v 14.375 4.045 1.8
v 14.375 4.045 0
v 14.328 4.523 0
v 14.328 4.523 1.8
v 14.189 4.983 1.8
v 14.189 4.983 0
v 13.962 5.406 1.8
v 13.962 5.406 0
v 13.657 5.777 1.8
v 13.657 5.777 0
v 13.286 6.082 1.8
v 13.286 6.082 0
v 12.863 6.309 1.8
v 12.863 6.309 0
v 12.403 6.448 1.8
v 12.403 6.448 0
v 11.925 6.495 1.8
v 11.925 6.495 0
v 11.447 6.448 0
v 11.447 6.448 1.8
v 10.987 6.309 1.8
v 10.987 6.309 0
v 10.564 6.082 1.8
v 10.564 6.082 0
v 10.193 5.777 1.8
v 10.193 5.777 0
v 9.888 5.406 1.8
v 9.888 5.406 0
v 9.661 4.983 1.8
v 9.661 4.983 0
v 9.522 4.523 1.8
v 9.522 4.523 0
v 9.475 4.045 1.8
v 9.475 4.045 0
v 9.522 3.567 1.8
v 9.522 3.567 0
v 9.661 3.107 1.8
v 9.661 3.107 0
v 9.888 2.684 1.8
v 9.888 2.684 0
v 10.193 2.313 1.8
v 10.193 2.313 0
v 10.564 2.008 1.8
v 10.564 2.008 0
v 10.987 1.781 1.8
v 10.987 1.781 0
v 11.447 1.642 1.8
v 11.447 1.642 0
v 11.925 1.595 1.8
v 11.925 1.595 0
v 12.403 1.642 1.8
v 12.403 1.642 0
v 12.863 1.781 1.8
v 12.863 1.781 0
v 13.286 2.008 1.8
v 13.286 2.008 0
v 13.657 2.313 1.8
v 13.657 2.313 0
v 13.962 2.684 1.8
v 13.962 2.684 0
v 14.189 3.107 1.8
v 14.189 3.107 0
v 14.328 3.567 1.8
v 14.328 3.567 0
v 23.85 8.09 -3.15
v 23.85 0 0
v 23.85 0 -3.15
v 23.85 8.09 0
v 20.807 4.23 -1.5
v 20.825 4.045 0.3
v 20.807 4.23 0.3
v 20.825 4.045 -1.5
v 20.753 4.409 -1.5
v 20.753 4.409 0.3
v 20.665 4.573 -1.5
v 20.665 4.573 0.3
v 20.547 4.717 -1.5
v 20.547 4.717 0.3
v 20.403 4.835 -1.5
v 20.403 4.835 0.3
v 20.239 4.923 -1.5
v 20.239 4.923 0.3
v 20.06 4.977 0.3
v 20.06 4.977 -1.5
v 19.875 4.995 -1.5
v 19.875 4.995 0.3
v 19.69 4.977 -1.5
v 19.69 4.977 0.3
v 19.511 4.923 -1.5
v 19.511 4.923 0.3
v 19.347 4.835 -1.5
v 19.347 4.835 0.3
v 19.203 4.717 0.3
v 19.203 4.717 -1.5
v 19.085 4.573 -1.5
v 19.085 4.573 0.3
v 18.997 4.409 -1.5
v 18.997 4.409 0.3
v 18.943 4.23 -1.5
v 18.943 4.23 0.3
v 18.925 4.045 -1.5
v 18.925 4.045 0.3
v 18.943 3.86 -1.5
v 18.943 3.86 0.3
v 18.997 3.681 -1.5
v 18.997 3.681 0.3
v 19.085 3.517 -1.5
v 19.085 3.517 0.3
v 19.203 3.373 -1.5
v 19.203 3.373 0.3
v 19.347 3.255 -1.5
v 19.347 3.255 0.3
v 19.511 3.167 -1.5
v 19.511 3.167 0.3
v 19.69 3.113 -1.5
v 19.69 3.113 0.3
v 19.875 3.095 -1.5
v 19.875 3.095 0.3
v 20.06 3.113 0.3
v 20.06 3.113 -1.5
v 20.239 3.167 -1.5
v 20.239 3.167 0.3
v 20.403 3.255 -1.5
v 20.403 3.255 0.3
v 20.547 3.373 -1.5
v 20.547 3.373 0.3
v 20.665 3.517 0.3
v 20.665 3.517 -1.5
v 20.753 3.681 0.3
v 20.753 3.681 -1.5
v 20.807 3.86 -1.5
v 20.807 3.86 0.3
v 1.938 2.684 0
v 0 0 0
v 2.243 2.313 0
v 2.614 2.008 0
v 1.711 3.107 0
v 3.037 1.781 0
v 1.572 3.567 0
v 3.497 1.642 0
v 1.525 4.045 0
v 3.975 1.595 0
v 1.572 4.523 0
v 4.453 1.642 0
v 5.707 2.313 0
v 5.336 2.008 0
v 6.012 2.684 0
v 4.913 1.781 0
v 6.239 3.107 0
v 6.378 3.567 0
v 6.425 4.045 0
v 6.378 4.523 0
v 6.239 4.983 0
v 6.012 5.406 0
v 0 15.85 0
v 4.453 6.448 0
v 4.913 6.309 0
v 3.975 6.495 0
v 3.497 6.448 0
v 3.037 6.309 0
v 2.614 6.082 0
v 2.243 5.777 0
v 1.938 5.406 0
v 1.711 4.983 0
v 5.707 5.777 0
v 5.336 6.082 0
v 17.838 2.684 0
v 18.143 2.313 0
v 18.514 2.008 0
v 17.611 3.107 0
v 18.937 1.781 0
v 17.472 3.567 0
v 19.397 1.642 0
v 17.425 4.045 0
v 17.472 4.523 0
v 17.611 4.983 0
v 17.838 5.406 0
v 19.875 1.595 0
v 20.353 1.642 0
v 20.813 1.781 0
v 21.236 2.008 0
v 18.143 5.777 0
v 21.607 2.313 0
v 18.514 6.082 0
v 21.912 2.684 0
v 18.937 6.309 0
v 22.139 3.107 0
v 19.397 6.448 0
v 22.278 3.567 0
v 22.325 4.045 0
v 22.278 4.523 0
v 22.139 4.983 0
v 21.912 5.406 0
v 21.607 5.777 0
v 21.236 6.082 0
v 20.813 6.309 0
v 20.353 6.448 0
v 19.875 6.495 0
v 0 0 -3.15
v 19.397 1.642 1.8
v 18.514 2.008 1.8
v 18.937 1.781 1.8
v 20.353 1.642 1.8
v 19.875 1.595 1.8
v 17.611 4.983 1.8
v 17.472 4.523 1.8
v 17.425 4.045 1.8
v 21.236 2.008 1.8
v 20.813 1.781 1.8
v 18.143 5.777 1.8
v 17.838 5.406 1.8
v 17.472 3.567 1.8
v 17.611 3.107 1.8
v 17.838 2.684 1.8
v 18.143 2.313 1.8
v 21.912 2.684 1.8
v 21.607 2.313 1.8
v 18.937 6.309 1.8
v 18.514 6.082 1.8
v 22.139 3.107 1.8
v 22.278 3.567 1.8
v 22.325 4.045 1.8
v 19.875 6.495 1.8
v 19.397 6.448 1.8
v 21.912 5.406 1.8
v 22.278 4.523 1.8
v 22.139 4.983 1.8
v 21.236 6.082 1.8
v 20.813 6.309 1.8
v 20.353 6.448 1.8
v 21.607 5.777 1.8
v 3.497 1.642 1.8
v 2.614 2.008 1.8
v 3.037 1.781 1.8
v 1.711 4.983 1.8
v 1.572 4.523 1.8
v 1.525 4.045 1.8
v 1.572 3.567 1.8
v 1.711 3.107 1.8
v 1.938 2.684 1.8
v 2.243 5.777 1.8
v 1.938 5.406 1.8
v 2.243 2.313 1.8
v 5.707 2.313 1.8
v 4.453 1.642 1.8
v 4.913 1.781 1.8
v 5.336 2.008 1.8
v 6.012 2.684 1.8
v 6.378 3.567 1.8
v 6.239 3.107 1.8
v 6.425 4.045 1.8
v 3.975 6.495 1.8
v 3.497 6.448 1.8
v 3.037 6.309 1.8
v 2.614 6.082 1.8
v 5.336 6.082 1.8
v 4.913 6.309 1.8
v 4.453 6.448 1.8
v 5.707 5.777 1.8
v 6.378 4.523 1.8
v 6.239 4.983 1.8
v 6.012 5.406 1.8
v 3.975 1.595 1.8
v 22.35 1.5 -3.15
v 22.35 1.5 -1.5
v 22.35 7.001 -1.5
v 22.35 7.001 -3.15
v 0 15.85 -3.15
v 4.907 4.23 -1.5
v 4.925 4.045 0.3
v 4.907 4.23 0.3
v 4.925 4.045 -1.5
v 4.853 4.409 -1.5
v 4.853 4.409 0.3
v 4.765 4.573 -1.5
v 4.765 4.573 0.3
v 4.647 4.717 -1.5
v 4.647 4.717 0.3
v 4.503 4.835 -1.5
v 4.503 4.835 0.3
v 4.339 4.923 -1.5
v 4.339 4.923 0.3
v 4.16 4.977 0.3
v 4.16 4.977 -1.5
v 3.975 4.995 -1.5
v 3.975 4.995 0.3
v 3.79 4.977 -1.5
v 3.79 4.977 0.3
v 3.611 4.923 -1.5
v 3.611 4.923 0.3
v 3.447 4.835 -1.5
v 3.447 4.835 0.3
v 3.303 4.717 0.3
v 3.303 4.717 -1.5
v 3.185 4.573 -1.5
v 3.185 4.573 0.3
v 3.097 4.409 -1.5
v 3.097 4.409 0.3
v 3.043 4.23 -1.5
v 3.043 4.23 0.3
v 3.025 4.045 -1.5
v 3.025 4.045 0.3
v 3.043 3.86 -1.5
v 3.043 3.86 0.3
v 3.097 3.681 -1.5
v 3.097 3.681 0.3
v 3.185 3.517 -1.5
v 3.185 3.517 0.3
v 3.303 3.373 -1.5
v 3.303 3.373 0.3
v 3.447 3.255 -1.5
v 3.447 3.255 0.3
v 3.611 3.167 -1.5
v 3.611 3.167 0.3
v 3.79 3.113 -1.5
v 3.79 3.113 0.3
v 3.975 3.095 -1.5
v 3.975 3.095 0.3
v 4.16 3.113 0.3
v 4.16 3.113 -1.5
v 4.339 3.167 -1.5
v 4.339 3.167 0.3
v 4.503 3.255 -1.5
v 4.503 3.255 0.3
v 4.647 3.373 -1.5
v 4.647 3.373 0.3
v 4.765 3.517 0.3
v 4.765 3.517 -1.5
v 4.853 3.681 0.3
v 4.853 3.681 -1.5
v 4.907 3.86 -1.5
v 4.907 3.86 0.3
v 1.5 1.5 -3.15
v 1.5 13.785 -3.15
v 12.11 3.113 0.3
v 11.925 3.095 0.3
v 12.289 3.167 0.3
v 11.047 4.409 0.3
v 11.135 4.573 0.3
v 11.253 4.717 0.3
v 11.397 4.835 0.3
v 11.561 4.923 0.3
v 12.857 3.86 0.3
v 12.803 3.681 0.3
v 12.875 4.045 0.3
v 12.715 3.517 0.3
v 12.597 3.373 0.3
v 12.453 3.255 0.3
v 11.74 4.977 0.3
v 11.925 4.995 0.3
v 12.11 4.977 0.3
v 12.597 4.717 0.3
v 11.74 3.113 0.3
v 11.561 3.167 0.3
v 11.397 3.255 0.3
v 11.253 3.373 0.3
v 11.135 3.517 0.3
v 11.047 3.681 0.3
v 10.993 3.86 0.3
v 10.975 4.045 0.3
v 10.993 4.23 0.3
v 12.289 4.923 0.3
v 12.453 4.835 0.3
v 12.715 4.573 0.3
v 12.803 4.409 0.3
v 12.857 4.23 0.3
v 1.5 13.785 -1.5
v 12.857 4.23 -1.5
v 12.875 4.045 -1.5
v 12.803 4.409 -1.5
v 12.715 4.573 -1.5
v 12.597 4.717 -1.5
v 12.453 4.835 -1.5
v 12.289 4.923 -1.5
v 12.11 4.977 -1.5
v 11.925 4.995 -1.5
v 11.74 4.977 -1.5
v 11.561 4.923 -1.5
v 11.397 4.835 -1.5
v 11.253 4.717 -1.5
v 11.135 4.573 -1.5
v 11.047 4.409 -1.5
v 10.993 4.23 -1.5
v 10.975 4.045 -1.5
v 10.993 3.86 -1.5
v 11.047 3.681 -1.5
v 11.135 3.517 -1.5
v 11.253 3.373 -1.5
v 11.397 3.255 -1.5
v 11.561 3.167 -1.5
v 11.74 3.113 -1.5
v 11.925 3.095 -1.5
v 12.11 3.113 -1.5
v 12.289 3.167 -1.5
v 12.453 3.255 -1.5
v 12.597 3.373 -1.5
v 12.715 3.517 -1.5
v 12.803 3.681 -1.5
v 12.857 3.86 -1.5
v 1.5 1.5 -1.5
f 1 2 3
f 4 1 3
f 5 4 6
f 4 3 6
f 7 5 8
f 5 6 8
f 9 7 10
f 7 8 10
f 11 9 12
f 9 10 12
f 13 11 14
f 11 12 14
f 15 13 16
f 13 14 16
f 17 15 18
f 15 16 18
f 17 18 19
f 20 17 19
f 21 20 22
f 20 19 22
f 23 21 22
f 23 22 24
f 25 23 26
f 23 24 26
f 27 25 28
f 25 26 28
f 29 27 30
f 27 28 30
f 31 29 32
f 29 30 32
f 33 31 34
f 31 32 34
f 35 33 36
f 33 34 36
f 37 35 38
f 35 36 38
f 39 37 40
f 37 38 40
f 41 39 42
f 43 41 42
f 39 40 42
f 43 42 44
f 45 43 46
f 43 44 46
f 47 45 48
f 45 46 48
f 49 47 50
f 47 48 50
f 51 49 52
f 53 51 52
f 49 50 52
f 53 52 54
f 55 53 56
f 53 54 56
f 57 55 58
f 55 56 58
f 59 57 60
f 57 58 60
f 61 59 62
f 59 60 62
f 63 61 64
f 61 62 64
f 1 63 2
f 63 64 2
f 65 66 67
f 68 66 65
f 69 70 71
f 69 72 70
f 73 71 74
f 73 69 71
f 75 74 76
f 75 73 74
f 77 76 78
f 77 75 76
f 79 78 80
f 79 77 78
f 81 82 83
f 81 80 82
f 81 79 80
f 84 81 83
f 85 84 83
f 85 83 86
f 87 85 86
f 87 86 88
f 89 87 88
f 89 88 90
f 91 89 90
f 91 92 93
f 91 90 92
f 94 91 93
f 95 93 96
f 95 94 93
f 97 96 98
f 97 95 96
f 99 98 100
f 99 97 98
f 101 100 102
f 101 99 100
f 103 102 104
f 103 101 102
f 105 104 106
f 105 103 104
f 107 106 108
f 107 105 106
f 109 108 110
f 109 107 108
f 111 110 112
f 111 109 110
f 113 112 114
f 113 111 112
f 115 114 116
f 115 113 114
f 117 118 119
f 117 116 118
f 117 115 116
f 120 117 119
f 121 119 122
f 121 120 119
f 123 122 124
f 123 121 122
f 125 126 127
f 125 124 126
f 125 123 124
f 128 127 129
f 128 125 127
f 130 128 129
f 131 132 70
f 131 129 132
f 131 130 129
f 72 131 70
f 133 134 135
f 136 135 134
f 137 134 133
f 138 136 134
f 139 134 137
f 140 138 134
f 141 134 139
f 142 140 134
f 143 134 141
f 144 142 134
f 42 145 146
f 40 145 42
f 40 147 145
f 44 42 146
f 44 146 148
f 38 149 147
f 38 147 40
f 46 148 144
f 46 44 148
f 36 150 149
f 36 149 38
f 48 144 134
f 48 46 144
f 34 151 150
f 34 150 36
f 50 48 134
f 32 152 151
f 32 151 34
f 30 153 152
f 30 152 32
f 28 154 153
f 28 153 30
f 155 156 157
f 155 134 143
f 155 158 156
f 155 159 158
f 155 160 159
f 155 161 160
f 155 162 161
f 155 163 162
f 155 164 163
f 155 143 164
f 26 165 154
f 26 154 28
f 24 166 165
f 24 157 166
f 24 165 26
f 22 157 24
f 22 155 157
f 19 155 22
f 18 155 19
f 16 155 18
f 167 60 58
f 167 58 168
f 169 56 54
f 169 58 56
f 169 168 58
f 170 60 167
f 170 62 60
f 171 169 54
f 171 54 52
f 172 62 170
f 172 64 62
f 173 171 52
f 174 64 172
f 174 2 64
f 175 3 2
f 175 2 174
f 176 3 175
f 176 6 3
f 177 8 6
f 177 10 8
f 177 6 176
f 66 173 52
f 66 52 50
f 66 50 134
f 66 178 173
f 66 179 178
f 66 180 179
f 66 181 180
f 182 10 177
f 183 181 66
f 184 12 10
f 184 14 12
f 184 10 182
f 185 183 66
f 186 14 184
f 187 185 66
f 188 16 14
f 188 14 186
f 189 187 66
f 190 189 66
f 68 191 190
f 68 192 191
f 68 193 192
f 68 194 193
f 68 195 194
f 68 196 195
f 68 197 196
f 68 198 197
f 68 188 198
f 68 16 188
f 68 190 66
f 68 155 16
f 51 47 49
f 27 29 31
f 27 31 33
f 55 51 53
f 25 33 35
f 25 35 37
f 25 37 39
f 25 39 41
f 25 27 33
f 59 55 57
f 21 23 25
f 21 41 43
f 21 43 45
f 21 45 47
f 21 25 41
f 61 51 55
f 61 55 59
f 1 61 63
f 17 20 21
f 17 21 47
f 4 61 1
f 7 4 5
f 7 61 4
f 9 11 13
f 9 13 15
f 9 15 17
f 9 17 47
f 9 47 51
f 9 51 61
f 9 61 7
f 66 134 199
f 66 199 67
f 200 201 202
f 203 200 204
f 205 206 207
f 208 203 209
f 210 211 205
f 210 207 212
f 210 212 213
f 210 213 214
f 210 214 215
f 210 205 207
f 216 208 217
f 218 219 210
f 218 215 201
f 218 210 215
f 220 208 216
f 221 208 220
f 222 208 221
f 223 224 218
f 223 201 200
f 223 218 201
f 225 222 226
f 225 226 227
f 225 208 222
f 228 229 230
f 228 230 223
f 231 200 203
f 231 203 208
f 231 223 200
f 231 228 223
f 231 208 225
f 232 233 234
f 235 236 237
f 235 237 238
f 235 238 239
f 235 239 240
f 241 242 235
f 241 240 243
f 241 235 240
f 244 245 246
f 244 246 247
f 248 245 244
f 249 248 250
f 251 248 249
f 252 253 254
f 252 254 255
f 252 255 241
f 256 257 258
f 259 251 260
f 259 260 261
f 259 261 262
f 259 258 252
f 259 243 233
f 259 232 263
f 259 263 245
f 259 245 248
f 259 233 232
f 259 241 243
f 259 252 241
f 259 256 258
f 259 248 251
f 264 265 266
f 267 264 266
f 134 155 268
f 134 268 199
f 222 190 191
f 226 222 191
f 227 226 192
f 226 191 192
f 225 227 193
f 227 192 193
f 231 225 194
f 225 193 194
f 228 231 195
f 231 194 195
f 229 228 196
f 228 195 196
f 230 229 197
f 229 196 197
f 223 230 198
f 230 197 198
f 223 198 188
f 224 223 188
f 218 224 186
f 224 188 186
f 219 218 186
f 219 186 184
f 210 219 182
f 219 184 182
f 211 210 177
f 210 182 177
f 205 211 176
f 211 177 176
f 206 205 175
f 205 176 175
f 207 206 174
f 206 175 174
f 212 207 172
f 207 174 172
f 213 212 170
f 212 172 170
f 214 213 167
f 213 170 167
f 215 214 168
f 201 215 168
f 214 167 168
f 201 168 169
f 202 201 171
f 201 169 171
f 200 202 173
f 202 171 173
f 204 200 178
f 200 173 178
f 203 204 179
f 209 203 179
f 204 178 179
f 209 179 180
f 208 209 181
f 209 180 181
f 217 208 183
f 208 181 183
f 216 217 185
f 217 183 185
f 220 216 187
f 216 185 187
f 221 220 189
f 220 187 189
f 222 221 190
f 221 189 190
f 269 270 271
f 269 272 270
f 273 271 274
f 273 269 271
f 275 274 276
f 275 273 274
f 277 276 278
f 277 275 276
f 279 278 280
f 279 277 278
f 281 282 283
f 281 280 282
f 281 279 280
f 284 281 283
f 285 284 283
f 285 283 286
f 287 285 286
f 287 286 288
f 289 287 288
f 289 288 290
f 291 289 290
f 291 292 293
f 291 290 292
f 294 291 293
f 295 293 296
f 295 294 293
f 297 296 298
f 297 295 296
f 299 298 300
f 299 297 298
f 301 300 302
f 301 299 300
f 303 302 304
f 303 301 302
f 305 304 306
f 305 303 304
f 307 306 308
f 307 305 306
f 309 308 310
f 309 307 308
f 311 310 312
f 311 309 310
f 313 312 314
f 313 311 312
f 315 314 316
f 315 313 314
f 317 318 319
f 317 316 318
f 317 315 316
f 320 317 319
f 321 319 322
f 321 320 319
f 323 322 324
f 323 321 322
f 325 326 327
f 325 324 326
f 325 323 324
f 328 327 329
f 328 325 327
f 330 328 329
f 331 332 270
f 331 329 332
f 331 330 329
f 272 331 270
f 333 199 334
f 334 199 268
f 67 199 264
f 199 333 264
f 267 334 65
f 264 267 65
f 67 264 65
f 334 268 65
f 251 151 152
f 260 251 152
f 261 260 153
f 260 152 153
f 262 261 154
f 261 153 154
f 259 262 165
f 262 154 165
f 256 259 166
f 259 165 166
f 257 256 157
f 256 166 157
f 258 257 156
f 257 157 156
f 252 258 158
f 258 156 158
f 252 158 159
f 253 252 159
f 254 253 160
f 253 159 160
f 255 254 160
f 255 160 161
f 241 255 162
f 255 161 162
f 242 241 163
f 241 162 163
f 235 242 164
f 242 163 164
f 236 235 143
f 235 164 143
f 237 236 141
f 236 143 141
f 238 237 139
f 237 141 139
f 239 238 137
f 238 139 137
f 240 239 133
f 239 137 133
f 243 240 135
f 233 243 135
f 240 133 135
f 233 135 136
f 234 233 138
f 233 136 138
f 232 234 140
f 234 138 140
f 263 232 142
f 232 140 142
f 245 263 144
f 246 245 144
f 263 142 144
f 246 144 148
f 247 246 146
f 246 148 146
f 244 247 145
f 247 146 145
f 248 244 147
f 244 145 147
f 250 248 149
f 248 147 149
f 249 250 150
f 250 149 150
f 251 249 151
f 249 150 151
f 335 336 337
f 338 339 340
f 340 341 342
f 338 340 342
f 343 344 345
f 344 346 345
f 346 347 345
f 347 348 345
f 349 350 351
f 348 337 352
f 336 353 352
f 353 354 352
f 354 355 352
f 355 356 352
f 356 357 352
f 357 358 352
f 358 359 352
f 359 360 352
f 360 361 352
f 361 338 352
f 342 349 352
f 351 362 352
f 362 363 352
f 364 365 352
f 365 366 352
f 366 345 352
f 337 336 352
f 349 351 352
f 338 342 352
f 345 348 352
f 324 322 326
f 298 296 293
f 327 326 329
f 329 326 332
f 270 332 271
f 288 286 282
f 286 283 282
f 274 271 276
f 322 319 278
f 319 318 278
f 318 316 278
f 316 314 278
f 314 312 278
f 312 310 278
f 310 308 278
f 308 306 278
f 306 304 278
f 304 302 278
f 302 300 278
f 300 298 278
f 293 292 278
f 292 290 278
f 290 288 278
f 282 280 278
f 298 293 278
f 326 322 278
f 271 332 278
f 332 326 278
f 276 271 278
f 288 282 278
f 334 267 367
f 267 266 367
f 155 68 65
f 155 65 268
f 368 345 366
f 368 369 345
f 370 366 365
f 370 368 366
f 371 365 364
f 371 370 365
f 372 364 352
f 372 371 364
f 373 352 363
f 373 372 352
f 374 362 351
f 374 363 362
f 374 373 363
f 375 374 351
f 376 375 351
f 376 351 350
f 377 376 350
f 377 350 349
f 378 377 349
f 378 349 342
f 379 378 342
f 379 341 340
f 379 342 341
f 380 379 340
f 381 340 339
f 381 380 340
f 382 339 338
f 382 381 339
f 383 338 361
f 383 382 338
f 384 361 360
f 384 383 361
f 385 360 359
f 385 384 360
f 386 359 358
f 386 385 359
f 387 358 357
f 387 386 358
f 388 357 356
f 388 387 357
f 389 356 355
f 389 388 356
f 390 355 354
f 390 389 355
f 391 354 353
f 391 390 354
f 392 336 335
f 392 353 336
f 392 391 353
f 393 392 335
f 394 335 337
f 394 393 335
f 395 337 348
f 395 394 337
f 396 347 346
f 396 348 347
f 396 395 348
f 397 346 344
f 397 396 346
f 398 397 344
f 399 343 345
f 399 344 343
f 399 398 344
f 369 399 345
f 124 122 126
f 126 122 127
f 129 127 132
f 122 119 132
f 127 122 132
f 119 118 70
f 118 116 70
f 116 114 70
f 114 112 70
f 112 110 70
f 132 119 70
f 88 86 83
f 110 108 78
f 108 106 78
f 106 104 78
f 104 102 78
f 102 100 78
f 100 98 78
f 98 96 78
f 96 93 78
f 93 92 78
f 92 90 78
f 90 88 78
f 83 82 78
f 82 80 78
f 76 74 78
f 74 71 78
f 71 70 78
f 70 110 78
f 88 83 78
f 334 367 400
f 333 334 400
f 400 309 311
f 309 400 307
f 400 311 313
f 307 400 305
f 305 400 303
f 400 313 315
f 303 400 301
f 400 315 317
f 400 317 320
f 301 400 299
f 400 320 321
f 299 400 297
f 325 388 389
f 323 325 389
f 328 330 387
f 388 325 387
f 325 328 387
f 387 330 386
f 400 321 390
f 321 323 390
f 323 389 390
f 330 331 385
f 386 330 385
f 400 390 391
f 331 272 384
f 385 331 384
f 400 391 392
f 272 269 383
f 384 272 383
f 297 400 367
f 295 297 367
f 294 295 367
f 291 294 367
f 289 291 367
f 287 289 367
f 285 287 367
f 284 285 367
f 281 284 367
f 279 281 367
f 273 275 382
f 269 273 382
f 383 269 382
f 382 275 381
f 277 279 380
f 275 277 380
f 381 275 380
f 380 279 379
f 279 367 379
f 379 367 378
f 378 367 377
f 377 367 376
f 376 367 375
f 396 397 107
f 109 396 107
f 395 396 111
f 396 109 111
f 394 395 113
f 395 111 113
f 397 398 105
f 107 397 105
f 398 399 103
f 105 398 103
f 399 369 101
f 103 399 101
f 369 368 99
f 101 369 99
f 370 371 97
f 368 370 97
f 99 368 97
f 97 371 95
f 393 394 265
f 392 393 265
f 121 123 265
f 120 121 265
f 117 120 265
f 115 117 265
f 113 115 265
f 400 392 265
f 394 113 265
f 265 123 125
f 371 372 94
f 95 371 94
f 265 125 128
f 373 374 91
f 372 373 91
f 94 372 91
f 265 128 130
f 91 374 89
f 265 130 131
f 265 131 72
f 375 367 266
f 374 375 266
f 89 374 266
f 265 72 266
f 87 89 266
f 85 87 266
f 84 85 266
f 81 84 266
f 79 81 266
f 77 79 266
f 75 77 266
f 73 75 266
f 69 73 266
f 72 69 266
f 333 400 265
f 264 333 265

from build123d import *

# Parameters (mm, degrees)
BOSS_EXTRUDE1_DEPTH = 3.15
SKETCH2_R           = 2.45
BOSS_EXTRUDE2_DEPTH = 1.8
SHELL1_T            = -1.5


with BuildPart() as part:
    # Sketch1 → Boss-Extrude1 (new body)
    with BuildSketch(Plane.XY):
        Polygon((0, 0), (23.85, 0), (23.85, 8.09), (0, 15.85), align=None)
    extrude(amount=-BOSS_EXTRUDE1_DEPTH)

    # Sketch2 → Boss-Extrude2 (add)
    with BuildSketch(Plane.XY):
        with Locations((3.975, 4.045)):
            Circle(SKETCH2_R)
        with Locations((11.925, 4.045)):
            Circle(SKETCH2_R)
        with Locations((19.875, 4.045)):
            Circle(SKETCH2_R)
    extrude(amount=BOSS_EXTRUDE2_DEPTH)

    # Shell1
    shell1_openings = [part.faces().sort_by_distance(p)[0] for p in [
        (10.636528822, 6.194612921, -3.15),
    ]]
    offset(amount=SHELL1_T, openings=shell1_openings, kind=Kind.INTERSECTION)


solid = part.part
